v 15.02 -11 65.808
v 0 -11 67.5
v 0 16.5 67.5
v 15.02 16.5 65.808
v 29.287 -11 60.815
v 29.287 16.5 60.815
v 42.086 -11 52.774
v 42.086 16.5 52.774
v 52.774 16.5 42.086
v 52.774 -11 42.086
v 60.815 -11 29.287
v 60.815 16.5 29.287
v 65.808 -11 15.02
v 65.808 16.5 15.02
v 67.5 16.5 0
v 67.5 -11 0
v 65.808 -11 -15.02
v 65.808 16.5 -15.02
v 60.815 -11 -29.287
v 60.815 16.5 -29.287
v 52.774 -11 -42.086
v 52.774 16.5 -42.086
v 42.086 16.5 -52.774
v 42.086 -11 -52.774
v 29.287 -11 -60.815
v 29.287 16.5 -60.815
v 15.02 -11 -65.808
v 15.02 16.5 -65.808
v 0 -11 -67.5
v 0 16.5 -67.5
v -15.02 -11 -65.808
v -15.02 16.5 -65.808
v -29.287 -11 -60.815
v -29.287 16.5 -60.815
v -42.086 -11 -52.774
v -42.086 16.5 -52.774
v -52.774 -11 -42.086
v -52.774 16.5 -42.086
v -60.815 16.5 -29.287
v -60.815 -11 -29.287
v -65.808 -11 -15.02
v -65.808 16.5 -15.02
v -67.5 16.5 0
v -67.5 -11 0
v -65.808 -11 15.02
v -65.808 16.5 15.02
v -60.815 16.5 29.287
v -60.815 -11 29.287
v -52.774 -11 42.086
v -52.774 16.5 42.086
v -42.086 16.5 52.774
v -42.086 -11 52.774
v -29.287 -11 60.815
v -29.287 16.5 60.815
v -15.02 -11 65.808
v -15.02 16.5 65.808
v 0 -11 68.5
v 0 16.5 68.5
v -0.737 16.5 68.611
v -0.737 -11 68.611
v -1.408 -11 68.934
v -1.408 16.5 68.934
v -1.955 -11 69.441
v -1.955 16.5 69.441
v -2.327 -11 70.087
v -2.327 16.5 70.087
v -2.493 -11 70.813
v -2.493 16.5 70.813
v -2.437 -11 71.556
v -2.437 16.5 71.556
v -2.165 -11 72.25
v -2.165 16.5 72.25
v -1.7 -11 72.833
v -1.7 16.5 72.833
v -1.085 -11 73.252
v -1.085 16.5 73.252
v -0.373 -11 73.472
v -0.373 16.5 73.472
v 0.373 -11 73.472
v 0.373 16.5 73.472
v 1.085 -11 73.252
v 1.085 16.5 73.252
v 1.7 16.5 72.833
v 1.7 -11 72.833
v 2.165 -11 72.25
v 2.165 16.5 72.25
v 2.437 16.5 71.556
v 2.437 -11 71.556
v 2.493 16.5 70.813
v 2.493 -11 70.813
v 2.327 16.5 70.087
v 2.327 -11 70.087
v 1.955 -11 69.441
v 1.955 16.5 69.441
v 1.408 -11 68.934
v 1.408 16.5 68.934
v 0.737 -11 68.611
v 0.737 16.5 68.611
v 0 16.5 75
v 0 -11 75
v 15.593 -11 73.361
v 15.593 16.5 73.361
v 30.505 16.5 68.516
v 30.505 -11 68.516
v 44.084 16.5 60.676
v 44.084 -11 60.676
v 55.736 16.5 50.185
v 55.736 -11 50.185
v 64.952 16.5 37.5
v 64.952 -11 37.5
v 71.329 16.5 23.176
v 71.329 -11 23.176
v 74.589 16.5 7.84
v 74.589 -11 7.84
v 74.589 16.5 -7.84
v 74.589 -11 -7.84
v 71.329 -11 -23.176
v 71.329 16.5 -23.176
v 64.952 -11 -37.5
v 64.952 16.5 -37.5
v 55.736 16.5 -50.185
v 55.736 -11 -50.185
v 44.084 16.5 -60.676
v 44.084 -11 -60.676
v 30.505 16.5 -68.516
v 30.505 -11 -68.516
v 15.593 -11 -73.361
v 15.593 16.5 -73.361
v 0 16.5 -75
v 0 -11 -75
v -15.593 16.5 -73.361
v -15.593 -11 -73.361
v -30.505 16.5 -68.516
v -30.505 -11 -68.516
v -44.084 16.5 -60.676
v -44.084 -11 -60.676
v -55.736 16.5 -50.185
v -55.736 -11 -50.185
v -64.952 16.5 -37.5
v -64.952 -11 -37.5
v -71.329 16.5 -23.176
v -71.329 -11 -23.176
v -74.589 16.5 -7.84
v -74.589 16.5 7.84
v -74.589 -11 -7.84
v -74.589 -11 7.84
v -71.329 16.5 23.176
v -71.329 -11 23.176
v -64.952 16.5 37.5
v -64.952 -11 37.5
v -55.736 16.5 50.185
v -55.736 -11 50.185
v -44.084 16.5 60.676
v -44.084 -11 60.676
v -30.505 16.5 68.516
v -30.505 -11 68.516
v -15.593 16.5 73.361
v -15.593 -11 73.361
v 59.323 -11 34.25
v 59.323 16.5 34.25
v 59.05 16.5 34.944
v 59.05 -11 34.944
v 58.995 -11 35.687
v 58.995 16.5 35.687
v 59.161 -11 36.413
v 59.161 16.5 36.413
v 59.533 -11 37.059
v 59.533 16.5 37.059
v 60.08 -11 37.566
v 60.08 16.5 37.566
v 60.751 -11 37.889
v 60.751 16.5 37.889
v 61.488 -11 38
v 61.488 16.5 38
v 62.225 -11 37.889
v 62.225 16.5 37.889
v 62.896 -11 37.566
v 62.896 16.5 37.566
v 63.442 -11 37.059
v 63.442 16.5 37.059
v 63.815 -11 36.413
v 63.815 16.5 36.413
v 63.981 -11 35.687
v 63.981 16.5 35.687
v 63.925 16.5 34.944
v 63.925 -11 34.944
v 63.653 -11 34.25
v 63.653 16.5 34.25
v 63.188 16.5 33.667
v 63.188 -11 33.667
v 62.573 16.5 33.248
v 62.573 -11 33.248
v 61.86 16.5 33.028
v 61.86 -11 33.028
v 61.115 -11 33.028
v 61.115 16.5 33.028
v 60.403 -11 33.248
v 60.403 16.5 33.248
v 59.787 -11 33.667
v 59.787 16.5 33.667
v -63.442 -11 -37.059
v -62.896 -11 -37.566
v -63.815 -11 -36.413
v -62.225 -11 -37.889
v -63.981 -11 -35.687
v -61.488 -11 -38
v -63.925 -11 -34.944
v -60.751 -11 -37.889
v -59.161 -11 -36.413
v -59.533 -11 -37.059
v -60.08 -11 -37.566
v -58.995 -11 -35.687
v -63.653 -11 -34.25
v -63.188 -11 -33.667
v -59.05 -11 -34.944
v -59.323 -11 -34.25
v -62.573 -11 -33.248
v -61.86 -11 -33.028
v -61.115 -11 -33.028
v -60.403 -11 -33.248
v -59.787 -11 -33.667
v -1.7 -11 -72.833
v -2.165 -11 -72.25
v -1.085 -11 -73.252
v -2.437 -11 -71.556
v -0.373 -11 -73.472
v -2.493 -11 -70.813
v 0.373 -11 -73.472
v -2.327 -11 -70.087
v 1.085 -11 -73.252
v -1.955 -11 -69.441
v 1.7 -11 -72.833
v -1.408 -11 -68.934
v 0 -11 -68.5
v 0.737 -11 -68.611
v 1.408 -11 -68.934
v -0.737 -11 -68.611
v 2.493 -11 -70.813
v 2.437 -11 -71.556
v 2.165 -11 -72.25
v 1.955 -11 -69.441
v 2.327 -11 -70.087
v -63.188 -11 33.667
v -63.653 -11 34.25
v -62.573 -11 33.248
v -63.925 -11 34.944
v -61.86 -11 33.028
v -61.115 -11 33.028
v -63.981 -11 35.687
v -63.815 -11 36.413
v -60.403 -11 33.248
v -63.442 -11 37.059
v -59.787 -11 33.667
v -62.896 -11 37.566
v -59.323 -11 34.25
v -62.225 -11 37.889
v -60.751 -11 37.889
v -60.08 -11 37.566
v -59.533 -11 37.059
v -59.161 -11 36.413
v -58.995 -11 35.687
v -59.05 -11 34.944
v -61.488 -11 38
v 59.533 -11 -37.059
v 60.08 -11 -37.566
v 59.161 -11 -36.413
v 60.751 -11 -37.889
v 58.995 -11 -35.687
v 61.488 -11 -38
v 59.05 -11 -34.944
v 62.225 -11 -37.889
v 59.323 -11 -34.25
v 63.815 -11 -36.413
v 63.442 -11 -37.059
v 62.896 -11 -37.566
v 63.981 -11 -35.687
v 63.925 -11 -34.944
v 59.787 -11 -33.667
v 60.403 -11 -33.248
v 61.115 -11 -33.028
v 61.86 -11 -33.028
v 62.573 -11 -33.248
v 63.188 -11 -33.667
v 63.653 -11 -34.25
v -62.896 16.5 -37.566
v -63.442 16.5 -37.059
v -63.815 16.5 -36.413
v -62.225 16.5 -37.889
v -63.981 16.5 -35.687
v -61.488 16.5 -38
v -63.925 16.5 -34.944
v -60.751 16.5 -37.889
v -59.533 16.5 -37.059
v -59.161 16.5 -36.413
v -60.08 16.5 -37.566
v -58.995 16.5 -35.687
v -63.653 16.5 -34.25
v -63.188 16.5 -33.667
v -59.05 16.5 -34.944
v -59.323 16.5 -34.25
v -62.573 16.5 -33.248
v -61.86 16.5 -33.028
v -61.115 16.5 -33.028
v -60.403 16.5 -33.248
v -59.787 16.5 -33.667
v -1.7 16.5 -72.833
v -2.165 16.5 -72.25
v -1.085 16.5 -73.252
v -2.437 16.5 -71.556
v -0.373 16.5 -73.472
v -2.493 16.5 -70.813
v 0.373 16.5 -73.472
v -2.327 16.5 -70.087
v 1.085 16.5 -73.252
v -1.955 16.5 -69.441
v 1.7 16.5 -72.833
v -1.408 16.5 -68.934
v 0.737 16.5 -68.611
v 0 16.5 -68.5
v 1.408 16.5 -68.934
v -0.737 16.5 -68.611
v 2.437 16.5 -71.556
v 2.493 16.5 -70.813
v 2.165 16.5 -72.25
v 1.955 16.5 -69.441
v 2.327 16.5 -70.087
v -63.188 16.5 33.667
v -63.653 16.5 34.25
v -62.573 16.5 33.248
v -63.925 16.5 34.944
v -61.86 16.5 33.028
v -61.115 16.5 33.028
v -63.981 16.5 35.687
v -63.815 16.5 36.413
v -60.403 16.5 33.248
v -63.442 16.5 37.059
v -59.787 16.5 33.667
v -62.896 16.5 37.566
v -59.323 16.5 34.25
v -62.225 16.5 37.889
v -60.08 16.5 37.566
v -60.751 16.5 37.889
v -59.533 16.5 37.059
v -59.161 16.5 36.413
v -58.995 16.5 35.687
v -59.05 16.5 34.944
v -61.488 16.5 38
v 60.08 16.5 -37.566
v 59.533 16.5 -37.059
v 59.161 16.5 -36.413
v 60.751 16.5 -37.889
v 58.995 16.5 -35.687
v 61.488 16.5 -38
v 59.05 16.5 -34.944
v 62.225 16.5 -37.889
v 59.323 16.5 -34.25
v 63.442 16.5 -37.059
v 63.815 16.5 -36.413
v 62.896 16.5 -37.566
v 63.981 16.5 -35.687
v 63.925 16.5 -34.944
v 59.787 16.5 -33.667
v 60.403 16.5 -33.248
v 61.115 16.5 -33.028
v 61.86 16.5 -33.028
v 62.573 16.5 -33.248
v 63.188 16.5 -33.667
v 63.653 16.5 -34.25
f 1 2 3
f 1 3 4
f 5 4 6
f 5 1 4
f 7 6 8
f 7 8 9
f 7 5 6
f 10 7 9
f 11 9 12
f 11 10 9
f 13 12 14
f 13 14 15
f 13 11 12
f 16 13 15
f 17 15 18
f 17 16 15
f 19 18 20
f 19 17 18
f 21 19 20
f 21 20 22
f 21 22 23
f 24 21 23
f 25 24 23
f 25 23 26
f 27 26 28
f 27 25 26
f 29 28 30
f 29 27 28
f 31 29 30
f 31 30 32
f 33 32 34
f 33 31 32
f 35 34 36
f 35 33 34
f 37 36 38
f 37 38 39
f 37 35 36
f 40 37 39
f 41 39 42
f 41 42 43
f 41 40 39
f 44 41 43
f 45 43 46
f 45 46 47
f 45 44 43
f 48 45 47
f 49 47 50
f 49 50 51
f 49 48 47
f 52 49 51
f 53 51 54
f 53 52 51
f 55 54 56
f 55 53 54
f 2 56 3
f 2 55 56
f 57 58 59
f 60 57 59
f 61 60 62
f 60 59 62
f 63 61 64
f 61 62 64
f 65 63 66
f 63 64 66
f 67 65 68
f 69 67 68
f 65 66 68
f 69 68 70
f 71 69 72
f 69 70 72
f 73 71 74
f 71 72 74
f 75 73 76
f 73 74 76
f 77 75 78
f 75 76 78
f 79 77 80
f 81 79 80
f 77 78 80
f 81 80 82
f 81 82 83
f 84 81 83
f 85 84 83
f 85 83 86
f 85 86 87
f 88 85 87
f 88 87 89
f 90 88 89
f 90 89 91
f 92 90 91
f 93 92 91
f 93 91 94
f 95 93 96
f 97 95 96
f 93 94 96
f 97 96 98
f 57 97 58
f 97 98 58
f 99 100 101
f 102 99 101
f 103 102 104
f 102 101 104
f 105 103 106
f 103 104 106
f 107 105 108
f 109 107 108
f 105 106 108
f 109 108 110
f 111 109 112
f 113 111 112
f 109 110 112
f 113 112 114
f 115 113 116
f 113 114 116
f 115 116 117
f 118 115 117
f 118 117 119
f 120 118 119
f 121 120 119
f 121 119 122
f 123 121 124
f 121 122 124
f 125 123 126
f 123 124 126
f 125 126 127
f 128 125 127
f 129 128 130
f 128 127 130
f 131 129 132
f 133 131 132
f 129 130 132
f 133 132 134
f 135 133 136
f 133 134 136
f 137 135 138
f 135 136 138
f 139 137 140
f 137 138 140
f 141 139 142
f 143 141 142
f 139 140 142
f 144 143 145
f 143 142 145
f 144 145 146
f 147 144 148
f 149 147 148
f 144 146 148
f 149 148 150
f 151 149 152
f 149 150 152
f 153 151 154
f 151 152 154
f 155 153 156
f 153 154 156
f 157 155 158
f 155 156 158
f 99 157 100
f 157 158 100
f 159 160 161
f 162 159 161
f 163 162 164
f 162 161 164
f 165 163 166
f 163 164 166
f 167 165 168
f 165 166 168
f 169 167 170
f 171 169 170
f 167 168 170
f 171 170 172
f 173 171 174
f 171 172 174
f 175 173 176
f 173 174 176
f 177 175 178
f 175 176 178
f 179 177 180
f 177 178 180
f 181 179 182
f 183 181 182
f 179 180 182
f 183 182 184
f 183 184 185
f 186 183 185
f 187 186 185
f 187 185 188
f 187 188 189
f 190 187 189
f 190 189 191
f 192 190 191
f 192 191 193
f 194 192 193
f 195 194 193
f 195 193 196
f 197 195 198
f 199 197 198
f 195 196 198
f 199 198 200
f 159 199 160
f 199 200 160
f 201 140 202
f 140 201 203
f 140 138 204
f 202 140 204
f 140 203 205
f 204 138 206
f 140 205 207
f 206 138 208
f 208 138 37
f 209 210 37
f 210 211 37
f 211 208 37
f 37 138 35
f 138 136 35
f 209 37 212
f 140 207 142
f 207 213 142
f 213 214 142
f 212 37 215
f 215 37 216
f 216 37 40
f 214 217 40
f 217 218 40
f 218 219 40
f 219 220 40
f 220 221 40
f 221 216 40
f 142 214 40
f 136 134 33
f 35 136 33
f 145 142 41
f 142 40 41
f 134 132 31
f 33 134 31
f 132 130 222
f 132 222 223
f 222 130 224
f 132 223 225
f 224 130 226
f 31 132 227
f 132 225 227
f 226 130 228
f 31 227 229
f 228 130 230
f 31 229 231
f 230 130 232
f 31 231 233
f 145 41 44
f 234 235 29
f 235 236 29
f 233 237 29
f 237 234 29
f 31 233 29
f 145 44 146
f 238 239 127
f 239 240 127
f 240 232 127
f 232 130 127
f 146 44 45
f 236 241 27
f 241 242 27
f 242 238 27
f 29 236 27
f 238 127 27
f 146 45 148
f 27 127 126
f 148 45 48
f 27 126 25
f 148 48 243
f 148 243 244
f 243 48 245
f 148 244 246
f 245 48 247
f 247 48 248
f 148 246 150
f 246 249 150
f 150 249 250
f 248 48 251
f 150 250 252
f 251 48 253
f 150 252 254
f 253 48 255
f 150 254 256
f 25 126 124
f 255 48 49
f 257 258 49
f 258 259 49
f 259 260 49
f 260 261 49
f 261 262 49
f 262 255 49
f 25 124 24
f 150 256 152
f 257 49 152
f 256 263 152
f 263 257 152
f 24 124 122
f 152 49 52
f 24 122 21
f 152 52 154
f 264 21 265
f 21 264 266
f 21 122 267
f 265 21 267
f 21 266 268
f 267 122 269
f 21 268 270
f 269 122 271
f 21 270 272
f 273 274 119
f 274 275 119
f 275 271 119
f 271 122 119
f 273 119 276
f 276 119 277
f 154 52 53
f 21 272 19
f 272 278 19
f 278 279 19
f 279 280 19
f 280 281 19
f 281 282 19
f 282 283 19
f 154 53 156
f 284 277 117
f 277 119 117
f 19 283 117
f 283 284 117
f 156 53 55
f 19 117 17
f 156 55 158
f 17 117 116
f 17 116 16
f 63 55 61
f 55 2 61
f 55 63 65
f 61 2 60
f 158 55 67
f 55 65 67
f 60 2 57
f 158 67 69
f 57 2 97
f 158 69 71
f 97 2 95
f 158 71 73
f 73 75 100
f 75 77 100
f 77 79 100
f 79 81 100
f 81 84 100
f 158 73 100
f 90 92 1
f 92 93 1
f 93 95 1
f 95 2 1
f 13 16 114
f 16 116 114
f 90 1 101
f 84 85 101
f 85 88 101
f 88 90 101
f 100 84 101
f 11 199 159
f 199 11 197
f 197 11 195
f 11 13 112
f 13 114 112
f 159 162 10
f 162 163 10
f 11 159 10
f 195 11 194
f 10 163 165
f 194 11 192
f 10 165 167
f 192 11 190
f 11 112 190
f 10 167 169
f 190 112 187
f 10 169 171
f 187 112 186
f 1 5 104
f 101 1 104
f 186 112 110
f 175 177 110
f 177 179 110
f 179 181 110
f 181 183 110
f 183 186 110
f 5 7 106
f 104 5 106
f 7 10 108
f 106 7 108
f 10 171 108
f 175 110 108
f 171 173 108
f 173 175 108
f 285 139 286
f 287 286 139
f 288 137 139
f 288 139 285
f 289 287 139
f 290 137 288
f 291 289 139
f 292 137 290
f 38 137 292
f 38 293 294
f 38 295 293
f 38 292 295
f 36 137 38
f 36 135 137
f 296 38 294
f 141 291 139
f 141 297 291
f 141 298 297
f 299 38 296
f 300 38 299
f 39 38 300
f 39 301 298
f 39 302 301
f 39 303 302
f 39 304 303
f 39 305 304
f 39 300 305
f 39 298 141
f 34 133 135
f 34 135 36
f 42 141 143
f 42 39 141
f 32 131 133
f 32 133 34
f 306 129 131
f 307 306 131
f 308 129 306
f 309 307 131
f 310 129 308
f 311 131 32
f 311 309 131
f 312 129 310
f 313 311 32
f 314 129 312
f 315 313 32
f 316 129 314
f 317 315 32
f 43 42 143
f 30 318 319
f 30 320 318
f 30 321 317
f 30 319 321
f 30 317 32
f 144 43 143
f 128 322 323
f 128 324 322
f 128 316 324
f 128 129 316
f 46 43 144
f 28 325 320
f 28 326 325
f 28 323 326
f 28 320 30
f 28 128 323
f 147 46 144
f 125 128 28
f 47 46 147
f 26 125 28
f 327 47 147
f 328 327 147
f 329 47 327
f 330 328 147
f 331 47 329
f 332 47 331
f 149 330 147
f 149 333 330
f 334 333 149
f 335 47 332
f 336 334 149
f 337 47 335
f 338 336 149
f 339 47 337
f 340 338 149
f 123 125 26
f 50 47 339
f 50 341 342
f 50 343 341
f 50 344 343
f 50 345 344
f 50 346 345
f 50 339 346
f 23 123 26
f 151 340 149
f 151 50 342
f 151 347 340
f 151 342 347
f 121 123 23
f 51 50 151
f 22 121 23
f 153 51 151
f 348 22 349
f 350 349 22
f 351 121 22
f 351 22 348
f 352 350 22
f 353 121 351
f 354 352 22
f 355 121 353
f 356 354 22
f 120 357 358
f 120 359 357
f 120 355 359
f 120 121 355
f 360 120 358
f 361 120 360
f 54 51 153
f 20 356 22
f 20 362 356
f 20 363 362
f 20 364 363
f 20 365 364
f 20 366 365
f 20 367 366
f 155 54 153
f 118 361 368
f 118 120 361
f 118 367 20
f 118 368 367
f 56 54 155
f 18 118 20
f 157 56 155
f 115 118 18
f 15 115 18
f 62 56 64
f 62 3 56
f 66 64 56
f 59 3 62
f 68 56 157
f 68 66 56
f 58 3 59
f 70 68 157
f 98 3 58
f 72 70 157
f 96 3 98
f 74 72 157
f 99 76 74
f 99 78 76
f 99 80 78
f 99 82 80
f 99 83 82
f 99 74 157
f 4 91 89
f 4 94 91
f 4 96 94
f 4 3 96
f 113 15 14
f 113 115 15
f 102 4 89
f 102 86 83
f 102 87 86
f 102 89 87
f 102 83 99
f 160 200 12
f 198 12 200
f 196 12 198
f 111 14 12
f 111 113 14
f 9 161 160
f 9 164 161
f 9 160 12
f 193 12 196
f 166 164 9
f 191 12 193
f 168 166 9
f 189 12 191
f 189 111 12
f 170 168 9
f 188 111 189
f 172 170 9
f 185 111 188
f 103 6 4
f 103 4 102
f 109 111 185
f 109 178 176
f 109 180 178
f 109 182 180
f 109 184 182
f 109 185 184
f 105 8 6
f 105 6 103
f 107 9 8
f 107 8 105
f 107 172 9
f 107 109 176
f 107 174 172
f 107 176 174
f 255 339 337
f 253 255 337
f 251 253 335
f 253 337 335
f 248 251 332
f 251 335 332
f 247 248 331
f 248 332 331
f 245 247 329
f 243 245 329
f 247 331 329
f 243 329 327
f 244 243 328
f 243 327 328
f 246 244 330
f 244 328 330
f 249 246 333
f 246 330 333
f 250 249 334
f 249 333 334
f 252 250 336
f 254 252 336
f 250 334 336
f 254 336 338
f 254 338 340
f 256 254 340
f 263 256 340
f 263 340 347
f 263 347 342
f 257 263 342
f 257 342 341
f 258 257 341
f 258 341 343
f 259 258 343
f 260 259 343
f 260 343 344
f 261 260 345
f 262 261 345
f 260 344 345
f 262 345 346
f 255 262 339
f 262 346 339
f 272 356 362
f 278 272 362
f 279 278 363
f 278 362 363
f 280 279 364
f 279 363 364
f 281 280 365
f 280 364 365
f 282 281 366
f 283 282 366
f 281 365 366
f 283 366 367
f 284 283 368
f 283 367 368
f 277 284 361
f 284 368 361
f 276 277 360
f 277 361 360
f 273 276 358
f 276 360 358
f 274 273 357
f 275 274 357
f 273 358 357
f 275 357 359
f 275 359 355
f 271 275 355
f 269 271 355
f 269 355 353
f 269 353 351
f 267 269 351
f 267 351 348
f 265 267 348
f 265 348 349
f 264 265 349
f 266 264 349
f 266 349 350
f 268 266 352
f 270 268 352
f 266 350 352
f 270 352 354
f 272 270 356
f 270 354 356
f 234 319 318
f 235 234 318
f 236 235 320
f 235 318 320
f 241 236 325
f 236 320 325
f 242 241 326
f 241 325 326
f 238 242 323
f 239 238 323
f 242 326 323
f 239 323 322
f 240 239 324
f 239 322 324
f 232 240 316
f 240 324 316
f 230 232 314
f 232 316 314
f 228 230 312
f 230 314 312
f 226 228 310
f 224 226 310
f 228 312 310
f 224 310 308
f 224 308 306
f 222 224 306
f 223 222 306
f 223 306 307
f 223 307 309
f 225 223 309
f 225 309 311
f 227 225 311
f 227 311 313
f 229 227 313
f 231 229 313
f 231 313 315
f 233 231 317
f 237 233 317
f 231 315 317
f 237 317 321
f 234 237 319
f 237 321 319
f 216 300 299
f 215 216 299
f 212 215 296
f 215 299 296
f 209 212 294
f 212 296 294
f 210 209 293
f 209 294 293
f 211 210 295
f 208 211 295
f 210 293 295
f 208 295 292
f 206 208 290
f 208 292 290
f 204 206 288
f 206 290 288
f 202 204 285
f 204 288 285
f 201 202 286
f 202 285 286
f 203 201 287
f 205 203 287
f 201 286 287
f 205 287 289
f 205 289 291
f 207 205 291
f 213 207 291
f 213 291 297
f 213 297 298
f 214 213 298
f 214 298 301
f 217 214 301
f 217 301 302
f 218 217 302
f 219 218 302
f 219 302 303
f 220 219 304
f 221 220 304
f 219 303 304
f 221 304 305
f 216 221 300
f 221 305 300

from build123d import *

# Parameters (mm, degrees)
SKETCH1_R           = 15
SKETCH1_R_2         = 13.5
BOSS_EXTRUDE1_DEPTH = 5.5
SKETCH2_R           = 0.5
CUT_EXTRUDE1_DEPTH  = 5.5
CIRPATTERN1_COUNT   = 6
SCALE1_SCALE        = 5


with BuildPart() as part:
    # Sketch1 → Boss-Extrude1 (new body)
    with BuildSketch(Plane(origin=(0, 0, 0), x_dir=(1, 0, 0), z_dir=(0, 1, 0))):
        with Locations(Location((0, 0, 0), (0, 0, 270))):
            Circle(SKETCH1_R)
        with Locations(Location((0, 0, 0), (0, 0, 270))):
            Circle(SKETCH1_R_2, mode=Mode.SUBTRACT)
    extrude(amount=BOSS_EXTRUDE1_DEPTH)

    # Sketch2 → Cut-Extrude1 (cut)
    with BuildSketch(Plane(origin=(0, 5.5, 0), x_dir=(1, 0, 0), z_dir=(0, 1, 0))):
        with Locations(Location((0, 14.2, 0), (0, 0, 270))):
            Circle(SKETCH2_R)
    cut_extrude1 = extrude(amount=-CUT_EXTRUDE1_DEPTH, mode=Mode.SUBTRACT)

    # CirPattern1: Cut-Extrude1 ×6 about axis
    cirpattern1_axis = Axis((0, 0, 0), (0, 1, 0))
    for i in range(1, CIRPATTERN1_COUNT):
        add(cut_extrude1.rotate(cirpattern1_axis, i * 360 / CIRPATTERN1_COUNT), mode=Mode.SUBTRACT)


with BuildPart() as part_1:
    # Scale1: scaled about (0, 2.75, 0)
    add(part.part.scale(SCALE1_SCALE).moved(Location((0, -11, 0))))


solid = part_1.part
